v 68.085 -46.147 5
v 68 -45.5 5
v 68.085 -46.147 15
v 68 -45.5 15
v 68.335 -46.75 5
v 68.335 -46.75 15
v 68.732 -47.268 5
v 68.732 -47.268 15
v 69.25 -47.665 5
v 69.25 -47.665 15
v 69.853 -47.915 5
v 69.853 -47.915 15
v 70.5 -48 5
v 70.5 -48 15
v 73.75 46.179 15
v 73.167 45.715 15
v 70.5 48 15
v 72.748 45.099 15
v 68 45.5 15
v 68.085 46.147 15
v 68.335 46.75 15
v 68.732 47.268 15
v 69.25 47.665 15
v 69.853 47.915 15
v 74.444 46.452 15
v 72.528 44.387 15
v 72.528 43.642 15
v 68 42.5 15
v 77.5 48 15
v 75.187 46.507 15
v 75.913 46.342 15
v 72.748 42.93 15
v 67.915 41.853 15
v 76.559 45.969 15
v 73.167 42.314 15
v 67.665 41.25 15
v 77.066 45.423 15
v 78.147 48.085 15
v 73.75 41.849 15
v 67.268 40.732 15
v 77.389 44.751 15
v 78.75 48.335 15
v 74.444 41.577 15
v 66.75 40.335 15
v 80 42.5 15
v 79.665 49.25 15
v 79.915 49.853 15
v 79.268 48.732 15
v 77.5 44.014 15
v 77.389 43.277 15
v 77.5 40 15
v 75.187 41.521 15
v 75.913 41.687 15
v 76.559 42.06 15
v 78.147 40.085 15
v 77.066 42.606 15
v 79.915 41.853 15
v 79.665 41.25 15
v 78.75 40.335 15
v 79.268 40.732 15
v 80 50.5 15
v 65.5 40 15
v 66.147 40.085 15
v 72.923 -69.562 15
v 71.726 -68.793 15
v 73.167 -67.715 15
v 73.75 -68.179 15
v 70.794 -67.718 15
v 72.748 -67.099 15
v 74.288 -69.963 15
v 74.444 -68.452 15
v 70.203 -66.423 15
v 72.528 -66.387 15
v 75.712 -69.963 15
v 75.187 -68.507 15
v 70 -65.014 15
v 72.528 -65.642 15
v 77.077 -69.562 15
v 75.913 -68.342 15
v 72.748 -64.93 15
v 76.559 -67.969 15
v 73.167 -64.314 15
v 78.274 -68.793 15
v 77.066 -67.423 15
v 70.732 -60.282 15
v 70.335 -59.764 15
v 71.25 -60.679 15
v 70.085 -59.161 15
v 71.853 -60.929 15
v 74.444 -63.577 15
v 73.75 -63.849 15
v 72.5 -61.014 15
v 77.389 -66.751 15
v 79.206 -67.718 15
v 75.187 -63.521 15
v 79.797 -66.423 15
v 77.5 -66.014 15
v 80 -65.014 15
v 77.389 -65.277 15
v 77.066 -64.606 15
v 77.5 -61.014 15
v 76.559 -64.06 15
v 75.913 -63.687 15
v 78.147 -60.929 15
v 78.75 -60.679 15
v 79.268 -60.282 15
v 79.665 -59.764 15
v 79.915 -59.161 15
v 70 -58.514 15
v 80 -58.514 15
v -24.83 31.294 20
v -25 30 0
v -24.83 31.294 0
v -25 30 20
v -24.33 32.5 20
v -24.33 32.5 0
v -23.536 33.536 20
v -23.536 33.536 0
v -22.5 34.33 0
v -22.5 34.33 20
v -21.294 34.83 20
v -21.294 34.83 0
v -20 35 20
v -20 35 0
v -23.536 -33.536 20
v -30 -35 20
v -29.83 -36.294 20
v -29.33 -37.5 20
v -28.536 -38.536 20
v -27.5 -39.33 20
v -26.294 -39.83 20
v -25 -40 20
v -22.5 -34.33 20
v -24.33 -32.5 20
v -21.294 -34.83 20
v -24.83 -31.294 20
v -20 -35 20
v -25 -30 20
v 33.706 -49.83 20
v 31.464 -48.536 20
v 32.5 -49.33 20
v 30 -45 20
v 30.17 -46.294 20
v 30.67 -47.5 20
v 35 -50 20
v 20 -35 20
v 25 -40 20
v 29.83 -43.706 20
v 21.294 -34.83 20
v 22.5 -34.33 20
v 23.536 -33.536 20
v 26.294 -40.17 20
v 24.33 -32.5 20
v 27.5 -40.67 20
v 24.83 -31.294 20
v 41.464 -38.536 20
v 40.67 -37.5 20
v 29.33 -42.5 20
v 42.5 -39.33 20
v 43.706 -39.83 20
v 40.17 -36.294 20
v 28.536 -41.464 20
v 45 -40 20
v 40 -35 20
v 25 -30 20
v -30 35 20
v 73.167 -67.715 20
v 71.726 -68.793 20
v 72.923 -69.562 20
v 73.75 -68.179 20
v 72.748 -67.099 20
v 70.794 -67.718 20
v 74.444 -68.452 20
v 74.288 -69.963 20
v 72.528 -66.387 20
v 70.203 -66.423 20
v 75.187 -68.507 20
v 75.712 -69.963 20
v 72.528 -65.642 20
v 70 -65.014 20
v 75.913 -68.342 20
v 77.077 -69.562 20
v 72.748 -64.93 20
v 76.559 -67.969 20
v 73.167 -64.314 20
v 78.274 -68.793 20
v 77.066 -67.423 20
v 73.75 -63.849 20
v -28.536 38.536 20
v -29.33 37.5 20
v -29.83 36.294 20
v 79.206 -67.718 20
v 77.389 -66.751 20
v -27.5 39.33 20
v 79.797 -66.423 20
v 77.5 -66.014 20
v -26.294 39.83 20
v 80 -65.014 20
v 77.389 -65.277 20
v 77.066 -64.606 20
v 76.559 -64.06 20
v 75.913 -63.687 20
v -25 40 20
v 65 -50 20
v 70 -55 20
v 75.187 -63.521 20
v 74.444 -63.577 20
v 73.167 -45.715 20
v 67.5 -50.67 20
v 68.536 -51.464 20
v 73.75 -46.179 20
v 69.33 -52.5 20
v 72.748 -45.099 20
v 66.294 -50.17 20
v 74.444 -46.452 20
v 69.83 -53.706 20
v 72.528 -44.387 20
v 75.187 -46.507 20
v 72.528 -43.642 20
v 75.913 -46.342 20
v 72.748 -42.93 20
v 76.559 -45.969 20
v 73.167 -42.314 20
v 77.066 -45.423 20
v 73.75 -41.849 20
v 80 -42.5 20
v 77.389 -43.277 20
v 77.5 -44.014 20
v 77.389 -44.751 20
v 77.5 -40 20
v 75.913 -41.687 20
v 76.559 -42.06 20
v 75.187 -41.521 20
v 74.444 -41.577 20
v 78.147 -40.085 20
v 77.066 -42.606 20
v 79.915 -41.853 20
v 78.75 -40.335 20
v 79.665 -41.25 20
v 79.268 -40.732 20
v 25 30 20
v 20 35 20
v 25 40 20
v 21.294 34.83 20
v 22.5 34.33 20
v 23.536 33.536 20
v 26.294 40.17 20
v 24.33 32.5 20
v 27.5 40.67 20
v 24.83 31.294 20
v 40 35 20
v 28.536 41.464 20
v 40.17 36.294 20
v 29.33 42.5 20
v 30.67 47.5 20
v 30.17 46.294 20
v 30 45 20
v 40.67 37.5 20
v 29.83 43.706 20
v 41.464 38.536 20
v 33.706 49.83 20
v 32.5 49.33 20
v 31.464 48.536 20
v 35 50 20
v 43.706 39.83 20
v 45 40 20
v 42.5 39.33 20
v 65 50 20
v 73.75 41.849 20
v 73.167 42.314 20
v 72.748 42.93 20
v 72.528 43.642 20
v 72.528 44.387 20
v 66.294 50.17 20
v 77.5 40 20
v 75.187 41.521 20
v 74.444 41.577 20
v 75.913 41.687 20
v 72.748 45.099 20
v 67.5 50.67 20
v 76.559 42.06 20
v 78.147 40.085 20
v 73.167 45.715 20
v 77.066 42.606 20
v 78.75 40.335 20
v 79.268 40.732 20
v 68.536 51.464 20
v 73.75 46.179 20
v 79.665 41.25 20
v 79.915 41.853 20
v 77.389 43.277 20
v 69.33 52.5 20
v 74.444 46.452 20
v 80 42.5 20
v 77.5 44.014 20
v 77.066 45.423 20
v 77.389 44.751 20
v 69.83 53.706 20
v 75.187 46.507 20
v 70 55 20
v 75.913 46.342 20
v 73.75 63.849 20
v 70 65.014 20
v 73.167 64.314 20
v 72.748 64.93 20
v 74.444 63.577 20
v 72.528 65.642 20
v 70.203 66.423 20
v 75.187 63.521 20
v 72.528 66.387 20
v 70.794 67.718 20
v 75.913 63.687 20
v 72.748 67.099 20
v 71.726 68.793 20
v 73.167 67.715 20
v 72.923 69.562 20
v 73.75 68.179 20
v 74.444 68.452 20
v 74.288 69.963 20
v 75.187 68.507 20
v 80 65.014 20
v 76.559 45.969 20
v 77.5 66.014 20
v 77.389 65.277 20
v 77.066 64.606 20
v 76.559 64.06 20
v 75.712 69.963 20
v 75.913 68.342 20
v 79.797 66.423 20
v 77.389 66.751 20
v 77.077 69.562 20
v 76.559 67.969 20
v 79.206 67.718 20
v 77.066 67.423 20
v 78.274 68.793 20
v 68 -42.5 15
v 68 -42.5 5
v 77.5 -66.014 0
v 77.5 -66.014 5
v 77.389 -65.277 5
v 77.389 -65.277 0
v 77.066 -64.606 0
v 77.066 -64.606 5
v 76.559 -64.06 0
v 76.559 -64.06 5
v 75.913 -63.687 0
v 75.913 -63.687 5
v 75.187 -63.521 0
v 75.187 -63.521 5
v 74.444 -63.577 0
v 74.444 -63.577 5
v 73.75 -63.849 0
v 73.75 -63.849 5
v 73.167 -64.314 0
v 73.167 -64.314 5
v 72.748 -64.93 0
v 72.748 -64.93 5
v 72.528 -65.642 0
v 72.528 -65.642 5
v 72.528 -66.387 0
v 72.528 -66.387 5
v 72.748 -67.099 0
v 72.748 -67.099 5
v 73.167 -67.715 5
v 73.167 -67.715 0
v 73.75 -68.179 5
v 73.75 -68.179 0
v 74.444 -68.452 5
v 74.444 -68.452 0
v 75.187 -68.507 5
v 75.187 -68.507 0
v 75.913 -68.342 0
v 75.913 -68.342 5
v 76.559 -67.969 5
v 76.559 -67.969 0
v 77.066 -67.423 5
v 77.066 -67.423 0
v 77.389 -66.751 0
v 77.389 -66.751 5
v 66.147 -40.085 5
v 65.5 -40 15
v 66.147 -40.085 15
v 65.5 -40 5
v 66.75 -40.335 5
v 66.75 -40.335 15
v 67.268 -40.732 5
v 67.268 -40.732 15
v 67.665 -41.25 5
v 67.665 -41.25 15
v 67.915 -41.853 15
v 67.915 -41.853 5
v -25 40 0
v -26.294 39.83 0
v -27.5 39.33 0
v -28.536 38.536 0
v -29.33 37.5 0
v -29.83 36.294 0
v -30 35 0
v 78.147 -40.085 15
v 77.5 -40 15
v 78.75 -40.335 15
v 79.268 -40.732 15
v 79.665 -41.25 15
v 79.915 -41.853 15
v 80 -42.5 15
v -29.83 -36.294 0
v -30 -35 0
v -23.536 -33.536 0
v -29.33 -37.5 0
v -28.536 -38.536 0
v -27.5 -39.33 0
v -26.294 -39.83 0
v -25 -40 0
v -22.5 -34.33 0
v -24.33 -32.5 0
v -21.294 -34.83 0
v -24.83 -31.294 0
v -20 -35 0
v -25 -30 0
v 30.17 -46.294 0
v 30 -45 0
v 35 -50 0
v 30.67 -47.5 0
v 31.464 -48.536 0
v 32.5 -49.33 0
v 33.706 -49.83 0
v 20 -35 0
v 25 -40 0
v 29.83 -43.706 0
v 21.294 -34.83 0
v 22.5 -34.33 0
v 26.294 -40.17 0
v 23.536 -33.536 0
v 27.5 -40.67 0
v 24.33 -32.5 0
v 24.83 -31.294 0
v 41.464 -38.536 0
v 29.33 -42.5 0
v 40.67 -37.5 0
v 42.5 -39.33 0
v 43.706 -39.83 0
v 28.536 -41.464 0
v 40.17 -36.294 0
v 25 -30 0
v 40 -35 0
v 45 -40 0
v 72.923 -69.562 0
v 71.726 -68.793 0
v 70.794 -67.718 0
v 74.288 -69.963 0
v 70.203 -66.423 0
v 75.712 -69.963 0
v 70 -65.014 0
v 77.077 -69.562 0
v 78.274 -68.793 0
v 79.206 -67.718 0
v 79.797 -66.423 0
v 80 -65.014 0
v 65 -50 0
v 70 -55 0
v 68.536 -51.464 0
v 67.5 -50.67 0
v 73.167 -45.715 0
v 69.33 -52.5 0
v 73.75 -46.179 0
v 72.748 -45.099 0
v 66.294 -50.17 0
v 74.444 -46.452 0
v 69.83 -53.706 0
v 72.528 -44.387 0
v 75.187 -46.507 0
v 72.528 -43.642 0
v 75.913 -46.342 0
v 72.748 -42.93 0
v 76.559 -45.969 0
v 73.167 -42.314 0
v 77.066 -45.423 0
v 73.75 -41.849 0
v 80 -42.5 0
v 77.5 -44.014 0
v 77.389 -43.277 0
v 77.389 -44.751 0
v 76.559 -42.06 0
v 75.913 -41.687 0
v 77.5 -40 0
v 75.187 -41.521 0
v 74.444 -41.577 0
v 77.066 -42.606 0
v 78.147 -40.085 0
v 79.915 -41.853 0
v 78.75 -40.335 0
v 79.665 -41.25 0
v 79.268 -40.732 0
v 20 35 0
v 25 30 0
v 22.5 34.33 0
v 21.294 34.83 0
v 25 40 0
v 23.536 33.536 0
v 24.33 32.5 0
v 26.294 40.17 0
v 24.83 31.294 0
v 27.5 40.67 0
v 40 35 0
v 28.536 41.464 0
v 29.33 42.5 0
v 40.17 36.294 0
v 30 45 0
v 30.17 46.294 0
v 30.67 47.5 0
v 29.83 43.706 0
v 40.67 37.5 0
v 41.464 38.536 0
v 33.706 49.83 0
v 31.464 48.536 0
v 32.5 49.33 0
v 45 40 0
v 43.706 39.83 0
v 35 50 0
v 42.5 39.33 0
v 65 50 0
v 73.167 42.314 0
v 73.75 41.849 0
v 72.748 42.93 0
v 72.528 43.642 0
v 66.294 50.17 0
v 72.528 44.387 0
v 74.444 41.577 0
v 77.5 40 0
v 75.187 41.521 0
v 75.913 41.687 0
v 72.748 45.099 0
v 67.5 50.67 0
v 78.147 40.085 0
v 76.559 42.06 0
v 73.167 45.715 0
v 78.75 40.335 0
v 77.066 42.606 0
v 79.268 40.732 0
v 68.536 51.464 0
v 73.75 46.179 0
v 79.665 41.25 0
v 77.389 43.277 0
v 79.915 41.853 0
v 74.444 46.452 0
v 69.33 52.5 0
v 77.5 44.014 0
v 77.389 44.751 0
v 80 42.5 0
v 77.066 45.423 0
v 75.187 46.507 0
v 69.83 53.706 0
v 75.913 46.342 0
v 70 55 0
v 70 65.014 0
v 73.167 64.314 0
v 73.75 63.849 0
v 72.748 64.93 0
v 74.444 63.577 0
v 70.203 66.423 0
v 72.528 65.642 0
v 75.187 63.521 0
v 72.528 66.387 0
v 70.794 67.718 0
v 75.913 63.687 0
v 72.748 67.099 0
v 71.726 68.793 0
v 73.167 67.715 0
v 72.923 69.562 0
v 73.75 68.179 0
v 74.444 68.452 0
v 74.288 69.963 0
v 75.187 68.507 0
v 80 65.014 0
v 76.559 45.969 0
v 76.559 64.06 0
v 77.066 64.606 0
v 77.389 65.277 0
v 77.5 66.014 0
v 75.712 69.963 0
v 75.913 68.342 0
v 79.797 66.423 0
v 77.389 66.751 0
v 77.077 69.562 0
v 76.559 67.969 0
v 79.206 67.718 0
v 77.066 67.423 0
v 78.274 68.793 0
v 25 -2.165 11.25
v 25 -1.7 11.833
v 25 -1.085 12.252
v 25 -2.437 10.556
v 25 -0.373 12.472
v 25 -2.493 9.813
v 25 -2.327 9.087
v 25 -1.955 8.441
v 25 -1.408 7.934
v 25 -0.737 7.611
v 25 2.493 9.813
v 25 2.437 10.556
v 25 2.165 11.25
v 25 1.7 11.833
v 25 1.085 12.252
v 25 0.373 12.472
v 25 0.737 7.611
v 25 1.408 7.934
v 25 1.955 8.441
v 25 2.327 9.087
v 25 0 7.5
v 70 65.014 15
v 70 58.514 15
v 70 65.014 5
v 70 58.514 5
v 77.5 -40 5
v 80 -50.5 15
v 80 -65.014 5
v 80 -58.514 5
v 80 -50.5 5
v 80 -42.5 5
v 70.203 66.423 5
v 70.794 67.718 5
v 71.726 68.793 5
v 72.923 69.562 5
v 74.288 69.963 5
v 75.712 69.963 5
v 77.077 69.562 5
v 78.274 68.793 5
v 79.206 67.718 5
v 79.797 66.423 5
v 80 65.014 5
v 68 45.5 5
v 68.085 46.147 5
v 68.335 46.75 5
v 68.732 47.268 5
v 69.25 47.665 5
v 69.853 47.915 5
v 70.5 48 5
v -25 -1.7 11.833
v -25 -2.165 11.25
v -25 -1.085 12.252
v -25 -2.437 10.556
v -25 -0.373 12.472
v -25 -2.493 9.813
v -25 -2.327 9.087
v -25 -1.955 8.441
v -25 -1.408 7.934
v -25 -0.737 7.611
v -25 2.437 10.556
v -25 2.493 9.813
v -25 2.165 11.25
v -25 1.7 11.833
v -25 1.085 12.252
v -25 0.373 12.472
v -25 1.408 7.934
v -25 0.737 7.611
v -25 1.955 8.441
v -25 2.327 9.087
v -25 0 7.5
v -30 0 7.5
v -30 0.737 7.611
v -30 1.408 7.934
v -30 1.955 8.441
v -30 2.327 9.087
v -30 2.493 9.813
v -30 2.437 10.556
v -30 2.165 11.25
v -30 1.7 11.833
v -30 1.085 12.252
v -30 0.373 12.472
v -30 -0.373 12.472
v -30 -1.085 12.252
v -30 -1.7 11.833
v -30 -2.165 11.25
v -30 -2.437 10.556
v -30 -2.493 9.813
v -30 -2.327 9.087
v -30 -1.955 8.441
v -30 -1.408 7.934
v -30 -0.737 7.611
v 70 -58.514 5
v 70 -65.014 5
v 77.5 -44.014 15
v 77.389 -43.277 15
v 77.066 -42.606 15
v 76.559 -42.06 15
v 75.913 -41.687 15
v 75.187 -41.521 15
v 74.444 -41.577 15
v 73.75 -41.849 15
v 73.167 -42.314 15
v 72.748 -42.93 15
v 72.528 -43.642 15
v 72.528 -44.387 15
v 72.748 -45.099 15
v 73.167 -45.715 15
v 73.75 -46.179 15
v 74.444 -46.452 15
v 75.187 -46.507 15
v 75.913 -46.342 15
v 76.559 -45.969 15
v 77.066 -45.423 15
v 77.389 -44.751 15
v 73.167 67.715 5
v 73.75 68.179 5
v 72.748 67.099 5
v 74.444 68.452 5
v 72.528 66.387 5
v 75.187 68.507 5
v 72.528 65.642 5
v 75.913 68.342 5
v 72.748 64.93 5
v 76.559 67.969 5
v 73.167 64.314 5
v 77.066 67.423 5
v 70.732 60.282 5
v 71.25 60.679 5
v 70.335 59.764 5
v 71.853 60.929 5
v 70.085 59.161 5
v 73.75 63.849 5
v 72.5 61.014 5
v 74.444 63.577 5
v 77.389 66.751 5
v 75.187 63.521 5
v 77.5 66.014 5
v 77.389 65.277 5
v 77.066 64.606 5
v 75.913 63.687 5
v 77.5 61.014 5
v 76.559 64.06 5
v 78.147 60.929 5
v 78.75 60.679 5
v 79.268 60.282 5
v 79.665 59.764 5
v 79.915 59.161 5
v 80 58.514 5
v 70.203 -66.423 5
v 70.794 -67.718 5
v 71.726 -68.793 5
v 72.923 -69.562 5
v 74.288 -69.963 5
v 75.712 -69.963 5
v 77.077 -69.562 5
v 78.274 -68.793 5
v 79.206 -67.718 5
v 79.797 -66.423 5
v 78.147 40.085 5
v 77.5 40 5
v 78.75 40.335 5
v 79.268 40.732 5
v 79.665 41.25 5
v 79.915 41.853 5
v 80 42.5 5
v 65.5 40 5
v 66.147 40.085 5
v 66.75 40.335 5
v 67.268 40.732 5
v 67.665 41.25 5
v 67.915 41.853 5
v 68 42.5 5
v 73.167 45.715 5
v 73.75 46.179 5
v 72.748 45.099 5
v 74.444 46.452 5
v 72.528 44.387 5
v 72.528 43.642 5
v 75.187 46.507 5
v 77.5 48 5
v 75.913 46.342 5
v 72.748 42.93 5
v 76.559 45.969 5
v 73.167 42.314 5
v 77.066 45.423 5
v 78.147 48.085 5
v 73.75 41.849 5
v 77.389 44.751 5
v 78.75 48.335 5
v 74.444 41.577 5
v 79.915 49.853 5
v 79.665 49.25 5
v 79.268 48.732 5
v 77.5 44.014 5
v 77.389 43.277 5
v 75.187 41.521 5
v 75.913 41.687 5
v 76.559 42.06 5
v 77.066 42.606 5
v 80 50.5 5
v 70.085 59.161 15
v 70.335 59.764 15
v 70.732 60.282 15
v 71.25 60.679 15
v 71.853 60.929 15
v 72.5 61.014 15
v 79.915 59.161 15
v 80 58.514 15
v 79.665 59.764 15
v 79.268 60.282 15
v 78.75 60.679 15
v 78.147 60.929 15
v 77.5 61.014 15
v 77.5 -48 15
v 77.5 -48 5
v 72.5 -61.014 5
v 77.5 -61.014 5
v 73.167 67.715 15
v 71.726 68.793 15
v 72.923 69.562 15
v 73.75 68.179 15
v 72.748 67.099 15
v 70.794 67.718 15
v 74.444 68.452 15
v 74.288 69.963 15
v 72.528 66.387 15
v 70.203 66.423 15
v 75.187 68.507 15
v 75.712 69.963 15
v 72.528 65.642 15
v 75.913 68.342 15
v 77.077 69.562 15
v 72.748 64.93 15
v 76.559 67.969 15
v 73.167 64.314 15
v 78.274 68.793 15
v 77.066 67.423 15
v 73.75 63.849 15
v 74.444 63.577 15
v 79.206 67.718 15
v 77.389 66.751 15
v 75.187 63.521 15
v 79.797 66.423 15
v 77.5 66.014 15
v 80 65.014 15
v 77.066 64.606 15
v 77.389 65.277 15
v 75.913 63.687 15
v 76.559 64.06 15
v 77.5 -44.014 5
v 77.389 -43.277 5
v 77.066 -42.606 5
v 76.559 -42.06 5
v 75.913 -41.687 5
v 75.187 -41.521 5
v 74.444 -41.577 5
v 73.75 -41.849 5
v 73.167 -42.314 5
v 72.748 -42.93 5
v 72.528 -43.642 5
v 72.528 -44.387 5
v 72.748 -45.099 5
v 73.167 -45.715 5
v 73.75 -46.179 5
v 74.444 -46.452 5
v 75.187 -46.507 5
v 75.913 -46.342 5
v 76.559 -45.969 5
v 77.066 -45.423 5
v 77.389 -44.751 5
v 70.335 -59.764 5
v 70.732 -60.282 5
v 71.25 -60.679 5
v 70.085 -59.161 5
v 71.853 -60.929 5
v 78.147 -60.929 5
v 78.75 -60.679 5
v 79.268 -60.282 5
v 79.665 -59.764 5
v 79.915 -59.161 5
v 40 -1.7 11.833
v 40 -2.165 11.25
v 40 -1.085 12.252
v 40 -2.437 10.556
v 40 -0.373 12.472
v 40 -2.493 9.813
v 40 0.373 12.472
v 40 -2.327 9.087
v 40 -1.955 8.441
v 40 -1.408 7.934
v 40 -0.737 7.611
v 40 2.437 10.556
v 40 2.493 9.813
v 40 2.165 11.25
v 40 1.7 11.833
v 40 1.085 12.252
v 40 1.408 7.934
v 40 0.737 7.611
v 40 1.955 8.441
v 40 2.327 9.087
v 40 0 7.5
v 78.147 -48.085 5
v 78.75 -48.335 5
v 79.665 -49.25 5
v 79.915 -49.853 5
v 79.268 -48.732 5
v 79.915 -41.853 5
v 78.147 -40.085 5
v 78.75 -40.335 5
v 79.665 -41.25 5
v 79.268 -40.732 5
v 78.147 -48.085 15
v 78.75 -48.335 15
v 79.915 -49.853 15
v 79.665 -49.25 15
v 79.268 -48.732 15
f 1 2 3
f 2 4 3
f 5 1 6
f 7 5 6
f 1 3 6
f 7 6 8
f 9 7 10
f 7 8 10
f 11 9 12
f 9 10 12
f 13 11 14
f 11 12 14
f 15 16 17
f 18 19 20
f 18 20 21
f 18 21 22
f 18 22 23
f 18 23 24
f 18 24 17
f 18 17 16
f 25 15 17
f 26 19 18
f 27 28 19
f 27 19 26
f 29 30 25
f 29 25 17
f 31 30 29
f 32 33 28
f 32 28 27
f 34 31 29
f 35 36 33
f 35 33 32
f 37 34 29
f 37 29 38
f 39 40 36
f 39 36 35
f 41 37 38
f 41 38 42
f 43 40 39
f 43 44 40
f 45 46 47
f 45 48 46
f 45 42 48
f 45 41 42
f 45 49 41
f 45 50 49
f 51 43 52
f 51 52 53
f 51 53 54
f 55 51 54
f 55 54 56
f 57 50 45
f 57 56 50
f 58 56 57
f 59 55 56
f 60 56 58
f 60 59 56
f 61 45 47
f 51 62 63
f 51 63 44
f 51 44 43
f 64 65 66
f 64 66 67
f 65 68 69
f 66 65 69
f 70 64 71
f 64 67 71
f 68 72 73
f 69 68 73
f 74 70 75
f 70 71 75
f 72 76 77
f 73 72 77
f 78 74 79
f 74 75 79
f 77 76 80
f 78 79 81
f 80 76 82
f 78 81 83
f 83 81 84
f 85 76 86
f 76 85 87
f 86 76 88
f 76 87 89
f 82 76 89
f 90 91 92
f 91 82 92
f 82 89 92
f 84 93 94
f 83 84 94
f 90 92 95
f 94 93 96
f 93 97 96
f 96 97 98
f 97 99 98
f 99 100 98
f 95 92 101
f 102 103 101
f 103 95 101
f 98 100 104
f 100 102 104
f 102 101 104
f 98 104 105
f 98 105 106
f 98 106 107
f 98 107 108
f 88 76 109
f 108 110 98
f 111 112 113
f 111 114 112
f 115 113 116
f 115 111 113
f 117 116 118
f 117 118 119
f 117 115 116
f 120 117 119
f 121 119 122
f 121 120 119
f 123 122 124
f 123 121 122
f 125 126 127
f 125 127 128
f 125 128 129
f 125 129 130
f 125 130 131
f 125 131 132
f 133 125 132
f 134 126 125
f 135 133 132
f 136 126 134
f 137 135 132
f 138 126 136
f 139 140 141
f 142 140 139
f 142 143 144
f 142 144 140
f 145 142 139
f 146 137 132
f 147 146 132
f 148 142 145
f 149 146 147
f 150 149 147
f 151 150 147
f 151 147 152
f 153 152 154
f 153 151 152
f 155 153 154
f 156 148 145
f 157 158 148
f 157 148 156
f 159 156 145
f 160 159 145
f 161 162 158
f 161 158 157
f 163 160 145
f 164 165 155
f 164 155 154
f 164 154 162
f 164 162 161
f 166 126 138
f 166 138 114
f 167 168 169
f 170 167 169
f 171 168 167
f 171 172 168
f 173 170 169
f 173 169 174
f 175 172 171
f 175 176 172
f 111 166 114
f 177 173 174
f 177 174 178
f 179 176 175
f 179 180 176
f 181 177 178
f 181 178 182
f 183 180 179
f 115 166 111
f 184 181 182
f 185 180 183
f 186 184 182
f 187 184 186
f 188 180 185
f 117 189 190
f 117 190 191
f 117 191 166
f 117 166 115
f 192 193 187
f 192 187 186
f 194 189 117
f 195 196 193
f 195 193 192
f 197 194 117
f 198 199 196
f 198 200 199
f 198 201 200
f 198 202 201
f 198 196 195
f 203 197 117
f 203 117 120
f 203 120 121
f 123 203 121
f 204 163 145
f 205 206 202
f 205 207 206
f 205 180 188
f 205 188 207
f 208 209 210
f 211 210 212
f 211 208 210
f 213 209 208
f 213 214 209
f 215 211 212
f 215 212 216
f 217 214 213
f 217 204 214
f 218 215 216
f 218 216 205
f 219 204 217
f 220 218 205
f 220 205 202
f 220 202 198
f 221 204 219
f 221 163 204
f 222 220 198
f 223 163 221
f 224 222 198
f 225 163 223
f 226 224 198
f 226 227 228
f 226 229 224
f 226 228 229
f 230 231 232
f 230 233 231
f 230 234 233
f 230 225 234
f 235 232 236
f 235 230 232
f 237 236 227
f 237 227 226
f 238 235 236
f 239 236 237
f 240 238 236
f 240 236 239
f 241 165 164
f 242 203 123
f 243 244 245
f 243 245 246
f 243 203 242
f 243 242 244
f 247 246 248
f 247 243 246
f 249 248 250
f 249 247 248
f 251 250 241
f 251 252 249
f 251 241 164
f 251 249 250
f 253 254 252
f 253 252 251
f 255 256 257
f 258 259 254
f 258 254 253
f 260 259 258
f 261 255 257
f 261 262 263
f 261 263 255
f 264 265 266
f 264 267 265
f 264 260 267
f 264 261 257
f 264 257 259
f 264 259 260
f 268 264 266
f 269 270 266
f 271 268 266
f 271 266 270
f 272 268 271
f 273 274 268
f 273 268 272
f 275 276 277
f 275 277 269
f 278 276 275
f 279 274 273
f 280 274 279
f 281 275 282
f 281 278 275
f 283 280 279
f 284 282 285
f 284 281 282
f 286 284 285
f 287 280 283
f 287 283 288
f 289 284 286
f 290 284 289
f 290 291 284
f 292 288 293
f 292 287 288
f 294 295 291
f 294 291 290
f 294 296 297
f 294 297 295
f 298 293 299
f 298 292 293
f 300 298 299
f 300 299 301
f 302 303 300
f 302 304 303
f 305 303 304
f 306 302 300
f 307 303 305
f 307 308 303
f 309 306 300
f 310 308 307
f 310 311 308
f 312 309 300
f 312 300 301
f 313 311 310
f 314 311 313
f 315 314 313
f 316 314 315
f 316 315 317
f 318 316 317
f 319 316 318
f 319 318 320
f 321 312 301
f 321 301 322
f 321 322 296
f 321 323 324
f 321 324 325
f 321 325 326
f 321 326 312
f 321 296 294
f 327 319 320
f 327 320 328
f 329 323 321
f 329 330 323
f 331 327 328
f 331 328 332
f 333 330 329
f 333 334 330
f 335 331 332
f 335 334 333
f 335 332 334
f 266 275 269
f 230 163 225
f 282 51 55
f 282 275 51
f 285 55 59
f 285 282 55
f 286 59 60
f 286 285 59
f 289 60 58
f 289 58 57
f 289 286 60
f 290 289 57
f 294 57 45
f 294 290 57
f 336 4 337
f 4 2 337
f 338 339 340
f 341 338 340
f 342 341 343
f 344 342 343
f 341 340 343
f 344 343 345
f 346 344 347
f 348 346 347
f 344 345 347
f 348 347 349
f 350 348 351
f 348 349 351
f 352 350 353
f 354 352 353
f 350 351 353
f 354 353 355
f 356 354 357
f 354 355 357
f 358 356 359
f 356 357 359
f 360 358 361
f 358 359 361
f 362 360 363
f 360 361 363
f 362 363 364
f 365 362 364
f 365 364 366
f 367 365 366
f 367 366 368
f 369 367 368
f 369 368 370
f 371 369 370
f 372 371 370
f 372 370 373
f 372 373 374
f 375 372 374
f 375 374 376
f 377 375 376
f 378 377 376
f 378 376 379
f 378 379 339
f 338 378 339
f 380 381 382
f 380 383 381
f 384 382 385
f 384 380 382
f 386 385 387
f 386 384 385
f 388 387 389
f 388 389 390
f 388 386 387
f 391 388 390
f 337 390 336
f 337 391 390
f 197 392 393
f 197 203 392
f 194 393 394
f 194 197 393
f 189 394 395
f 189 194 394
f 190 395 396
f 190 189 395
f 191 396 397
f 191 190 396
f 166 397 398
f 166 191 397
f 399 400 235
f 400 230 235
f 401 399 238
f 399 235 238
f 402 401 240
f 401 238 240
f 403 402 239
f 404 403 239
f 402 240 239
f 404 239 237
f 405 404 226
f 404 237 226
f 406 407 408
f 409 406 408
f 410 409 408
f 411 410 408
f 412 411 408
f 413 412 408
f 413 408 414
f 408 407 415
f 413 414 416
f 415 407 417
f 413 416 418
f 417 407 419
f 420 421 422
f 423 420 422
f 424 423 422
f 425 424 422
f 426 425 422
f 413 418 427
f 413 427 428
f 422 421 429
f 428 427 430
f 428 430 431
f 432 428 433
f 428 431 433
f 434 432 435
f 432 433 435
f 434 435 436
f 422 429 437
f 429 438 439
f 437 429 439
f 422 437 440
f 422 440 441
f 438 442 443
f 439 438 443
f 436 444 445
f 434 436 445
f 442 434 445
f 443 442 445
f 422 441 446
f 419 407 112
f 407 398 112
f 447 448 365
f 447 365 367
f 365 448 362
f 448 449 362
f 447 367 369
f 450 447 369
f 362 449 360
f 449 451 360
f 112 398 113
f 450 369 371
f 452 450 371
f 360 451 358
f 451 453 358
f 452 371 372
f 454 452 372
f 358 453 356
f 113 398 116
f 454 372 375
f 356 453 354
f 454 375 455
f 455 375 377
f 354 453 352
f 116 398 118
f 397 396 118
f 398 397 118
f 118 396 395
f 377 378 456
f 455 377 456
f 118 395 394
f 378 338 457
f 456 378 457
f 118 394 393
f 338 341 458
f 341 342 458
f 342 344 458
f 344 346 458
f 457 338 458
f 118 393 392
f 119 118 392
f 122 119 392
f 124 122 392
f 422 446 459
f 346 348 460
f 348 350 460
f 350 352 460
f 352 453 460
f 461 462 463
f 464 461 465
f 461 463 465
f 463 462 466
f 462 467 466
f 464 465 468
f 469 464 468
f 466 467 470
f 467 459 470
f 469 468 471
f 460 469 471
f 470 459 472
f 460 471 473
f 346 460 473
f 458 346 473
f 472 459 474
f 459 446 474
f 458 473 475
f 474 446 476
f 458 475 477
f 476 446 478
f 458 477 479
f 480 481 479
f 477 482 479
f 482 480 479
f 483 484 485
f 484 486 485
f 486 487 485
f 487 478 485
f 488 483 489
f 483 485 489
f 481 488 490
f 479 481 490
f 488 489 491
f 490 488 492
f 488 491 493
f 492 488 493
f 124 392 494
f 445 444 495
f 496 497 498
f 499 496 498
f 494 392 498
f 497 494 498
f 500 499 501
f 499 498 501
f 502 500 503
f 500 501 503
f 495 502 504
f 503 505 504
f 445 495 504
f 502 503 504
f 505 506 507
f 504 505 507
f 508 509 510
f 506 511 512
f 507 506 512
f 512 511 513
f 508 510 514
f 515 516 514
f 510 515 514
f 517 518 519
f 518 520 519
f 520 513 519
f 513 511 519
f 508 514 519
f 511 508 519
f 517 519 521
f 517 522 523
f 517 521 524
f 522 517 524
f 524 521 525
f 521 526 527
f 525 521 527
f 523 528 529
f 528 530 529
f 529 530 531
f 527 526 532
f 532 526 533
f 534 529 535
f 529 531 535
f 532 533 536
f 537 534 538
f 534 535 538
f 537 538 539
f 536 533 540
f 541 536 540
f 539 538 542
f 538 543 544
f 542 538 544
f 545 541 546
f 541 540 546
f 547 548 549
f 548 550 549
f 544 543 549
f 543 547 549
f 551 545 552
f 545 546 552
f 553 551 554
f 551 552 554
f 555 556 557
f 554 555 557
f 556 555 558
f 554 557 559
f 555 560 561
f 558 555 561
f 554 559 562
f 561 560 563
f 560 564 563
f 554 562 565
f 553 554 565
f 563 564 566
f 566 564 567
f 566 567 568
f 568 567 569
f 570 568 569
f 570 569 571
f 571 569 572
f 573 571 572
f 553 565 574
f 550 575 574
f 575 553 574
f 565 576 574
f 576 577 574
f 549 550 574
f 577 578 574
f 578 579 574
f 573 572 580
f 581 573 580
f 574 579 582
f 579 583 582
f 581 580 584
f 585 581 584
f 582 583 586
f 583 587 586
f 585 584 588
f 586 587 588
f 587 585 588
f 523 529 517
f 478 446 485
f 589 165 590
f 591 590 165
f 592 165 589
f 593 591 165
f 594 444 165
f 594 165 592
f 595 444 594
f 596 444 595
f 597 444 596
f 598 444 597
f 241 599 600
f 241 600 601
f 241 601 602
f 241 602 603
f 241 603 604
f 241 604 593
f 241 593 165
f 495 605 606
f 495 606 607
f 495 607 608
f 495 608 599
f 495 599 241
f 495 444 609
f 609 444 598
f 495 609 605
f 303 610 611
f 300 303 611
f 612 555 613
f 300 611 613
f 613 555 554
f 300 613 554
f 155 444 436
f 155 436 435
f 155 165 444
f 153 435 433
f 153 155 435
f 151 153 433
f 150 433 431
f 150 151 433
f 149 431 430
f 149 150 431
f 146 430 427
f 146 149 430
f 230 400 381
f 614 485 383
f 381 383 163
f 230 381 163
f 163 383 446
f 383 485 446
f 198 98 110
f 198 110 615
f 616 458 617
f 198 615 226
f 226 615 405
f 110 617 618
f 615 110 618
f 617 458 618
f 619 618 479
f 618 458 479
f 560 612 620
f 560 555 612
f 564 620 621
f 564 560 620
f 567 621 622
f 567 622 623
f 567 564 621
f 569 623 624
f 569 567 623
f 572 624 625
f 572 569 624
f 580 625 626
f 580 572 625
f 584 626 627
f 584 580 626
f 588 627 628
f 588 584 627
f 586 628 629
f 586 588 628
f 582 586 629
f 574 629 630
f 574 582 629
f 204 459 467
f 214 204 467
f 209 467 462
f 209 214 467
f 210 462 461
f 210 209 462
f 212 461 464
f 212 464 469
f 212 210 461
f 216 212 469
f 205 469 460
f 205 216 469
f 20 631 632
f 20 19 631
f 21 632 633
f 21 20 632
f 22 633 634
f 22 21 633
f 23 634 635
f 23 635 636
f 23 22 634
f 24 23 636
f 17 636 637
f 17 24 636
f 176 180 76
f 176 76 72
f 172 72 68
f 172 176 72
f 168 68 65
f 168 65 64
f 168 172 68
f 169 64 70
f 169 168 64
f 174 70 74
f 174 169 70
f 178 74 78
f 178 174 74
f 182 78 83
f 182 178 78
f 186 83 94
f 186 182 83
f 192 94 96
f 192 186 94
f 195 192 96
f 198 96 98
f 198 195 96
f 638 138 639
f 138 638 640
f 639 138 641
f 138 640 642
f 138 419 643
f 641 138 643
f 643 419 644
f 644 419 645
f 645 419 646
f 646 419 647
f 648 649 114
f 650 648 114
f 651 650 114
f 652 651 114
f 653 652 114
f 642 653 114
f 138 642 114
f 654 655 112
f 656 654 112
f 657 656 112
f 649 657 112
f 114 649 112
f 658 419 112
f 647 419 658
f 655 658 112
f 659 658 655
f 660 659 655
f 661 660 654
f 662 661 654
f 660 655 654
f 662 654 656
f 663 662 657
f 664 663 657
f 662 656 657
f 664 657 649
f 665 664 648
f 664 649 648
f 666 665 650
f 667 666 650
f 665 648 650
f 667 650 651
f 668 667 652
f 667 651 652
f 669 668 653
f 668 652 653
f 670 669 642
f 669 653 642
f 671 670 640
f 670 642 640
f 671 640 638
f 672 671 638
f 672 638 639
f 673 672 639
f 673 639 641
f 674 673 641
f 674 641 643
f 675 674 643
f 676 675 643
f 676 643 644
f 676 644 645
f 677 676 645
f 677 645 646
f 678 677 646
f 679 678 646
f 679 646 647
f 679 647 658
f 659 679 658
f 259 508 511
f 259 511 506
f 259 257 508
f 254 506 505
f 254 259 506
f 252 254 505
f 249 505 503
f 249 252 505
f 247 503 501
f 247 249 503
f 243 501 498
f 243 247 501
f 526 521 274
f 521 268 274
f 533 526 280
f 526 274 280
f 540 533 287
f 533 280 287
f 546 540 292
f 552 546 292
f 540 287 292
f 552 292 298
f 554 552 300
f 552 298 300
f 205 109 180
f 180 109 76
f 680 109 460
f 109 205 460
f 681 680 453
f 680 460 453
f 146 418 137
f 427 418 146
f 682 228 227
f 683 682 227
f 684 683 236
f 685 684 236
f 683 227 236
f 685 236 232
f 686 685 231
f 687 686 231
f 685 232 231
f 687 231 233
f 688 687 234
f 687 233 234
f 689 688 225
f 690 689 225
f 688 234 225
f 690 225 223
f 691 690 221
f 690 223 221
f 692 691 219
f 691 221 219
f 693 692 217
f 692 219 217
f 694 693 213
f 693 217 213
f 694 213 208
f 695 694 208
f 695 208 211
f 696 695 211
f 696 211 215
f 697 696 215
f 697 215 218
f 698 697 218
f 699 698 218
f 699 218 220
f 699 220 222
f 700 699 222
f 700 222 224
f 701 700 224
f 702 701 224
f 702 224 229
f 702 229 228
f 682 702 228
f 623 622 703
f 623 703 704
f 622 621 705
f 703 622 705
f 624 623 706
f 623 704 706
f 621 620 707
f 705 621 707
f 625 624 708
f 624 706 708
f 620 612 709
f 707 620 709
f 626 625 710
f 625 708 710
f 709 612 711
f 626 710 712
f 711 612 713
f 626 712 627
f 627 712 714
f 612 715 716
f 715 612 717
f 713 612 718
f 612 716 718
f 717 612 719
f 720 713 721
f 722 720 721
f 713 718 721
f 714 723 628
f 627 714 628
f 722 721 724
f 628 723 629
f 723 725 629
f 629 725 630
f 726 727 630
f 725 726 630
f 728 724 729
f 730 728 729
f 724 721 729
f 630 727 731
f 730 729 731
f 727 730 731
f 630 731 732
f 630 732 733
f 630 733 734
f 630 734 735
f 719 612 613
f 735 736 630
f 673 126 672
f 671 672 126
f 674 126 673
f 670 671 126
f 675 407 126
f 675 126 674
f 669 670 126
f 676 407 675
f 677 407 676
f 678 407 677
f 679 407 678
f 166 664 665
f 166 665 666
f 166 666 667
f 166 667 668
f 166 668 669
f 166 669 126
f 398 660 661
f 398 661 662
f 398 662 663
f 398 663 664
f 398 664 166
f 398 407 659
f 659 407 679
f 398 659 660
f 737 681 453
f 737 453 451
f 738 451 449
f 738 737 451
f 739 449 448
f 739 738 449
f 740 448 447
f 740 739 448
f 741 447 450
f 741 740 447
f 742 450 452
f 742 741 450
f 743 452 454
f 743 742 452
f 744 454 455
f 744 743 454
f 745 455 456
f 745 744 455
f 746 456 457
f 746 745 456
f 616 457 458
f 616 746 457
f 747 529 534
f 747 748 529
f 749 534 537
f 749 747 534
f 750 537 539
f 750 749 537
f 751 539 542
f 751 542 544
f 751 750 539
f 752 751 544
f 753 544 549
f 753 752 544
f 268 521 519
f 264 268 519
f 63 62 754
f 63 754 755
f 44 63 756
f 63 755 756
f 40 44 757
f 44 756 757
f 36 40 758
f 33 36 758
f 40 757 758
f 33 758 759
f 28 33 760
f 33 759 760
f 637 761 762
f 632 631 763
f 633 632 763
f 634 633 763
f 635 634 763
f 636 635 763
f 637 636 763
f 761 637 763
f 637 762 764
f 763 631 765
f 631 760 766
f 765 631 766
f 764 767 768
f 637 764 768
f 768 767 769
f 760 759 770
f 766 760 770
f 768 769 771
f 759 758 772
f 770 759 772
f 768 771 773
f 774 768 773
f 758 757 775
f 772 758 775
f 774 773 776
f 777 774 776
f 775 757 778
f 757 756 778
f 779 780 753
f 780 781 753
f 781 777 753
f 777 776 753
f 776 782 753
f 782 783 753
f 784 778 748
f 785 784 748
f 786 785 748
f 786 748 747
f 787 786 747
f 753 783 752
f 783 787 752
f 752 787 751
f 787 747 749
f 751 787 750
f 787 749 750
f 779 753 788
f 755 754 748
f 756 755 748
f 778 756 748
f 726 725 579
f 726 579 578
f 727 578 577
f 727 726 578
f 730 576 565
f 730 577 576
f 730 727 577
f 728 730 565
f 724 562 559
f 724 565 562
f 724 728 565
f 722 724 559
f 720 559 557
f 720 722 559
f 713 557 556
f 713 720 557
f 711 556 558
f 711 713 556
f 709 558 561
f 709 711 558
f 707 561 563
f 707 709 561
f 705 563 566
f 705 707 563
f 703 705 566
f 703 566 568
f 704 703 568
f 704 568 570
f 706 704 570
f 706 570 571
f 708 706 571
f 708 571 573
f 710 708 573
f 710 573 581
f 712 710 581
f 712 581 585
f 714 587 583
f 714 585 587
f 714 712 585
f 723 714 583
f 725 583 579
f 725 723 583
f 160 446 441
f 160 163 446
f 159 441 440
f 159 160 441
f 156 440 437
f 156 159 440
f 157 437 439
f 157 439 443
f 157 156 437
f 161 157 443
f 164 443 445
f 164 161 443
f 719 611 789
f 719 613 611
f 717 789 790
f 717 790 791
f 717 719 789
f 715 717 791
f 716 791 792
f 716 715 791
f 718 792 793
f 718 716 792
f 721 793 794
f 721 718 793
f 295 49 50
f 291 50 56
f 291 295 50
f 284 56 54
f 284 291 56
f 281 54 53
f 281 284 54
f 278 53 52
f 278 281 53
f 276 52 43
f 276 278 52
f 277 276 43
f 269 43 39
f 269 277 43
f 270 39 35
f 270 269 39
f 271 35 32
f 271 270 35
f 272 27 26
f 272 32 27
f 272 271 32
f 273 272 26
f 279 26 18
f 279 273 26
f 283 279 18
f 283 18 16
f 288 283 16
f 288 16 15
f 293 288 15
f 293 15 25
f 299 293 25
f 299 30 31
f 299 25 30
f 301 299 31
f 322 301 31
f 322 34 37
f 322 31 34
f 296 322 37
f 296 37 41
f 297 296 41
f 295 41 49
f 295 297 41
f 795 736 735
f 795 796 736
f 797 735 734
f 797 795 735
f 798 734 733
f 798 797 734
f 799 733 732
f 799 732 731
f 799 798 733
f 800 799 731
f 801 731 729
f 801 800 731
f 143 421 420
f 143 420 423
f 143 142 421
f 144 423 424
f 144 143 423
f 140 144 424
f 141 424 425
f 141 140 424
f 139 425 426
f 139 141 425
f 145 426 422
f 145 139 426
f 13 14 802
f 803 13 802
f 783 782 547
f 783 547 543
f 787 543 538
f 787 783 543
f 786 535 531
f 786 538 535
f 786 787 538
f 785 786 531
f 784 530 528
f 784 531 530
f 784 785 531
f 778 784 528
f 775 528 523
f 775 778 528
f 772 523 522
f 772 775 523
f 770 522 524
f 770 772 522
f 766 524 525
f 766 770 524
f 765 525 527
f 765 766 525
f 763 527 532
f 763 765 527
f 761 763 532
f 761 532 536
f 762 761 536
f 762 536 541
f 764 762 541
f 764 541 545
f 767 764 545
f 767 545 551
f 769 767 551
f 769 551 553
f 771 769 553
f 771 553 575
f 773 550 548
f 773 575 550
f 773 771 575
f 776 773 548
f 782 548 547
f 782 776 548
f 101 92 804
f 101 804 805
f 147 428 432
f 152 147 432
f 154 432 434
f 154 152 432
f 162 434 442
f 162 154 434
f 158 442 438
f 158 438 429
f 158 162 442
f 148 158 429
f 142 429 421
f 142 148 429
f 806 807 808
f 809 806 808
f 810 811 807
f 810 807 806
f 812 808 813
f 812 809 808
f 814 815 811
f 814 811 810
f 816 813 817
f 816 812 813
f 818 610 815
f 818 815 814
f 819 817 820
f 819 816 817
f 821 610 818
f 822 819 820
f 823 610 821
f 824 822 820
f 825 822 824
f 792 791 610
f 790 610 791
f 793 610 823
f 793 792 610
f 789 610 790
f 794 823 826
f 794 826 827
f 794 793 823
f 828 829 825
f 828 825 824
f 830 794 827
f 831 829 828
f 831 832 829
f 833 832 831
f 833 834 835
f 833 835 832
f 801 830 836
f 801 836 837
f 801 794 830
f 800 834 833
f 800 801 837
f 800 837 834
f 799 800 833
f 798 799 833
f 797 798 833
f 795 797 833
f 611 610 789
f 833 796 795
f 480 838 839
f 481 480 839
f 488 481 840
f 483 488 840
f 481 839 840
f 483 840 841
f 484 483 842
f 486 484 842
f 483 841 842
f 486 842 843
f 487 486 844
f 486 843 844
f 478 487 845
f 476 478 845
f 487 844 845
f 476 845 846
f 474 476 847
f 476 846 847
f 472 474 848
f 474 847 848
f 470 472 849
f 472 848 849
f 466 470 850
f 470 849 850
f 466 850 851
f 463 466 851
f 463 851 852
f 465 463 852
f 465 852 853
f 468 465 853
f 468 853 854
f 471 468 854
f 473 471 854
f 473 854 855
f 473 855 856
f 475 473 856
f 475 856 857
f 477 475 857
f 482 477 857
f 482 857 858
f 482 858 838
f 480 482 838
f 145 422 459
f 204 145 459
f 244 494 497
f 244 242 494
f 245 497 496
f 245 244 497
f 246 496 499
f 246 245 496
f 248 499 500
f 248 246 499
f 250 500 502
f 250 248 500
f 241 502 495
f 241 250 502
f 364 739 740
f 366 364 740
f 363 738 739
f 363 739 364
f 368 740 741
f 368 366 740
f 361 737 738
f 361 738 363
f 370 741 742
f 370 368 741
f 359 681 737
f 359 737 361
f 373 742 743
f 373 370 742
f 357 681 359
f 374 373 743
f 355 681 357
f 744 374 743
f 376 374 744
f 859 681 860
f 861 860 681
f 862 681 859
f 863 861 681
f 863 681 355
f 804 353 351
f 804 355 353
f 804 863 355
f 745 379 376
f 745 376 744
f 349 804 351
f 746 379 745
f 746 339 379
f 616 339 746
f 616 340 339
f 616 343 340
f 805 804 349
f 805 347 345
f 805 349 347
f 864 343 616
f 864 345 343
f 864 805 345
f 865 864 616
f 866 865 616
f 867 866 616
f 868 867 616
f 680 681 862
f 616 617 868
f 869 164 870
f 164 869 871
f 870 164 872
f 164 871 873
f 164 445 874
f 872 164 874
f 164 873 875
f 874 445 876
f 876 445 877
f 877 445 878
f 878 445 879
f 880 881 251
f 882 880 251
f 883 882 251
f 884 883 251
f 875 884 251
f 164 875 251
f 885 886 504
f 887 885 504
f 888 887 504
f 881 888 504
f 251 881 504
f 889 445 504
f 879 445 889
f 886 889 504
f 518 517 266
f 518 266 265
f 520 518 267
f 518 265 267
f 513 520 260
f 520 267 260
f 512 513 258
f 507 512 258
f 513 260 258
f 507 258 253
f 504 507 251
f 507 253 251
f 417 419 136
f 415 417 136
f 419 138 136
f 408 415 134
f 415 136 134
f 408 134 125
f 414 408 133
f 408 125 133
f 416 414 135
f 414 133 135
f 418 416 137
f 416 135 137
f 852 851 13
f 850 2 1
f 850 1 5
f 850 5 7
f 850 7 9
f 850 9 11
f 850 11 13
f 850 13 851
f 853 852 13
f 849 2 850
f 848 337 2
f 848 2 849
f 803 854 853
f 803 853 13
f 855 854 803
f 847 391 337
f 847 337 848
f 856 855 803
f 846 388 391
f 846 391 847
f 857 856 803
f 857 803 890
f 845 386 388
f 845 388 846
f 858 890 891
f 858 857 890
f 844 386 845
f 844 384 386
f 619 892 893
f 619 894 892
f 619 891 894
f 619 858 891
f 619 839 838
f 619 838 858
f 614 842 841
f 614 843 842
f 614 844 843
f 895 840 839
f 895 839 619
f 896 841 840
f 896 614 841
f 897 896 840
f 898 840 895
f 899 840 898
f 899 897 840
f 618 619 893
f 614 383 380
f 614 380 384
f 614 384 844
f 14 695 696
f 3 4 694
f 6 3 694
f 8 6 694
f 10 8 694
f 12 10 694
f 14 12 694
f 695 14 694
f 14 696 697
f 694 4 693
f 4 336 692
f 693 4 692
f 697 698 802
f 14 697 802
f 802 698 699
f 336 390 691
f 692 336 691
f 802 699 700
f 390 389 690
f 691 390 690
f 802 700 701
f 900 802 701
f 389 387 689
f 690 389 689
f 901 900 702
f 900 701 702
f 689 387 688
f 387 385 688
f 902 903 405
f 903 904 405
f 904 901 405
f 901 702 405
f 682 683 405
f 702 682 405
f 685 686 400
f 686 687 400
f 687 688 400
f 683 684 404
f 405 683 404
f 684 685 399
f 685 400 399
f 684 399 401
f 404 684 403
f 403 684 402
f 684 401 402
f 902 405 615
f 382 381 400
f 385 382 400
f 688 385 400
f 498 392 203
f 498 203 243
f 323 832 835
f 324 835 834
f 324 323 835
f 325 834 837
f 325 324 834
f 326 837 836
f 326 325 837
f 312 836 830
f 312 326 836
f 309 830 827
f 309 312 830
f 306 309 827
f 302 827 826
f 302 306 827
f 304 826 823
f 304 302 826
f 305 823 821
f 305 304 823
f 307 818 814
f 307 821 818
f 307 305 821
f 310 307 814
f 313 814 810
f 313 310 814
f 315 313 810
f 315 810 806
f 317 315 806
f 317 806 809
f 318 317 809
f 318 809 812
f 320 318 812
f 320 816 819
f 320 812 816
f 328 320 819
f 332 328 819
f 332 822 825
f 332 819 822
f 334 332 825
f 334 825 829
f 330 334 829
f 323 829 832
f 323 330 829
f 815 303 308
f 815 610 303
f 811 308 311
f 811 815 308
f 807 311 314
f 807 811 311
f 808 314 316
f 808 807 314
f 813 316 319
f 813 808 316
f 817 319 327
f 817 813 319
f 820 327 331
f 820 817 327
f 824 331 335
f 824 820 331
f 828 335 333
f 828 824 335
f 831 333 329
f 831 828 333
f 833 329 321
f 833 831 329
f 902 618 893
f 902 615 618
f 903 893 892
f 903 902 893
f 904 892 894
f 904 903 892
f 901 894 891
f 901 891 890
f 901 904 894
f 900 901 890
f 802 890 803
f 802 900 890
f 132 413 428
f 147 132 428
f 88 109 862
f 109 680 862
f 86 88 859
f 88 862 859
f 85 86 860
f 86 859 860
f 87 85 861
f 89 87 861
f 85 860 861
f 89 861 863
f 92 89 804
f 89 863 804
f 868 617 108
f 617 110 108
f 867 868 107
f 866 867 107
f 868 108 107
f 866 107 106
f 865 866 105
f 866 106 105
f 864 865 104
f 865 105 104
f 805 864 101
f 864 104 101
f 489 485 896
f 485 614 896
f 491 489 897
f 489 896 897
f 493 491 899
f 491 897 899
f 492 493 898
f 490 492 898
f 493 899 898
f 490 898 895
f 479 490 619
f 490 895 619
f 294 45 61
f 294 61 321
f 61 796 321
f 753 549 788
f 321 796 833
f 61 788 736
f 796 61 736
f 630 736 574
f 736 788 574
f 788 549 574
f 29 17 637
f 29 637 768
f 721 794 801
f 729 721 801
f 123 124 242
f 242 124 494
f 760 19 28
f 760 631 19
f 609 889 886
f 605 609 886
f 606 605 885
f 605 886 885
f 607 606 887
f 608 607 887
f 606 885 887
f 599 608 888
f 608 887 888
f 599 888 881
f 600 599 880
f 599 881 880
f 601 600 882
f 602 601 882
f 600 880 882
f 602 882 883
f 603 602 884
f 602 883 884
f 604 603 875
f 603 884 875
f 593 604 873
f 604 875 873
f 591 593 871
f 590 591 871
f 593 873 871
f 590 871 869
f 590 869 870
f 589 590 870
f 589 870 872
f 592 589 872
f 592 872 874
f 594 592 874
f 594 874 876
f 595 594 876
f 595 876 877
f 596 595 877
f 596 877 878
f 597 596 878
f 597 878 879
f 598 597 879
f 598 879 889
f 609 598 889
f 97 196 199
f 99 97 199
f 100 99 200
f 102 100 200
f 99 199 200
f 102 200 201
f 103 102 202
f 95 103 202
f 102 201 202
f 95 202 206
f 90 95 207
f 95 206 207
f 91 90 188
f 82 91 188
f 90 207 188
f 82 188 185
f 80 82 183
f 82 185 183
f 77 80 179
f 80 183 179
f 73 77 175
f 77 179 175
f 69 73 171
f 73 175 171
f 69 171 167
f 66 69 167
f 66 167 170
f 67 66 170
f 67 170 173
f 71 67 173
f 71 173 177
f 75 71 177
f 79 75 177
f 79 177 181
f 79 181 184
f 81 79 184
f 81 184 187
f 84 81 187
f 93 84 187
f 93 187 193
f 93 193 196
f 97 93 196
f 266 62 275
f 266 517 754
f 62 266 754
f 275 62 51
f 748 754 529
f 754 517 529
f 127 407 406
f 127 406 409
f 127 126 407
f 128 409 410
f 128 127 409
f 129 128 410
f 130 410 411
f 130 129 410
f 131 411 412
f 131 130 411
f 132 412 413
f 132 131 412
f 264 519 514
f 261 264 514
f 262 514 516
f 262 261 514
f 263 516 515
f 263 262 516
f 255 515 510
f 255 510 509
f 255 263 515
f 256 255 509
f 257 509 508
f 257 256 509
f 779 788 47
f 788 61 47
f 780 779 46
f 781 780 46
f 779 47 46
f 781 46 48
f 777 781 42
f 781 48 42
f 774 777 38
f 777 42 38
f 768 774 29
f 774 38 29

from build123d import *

# Parameters (mm, degrees)
SKETCH1_W           = 60
SKETCH1_H           = 80
SKETCH1_W_2         = 50
SKETCH1_H_2         = 70
EXTRUDE_THIN2_DEPTH = 20
EXTRUDE_THIN4_START = -20
EXTRUDE_THIN4_DEPTH = 20
SKETCH3_R           = 2.5
CUT_EXTRUDE1_DEPTH  = 115.891252931
SKETCH4_W           = 17.535354843
SKETCH4_H           = 20
CUT_EXTRUDE2_DEPTH  = 115.891252931
FILLET1_RADIUS      = 5
FILLET1_LENGTH      = 20
SKETCH5_W           = 12
SKETCH5_H           = 8
SKETCH5_W_2         = 13.595286796
SKETCH5_H_2         = 19.881342556
CUT_EXTRUDE3_DEPTH  = 5
FILLET2_RADIUS      = 5
FILLET2_LENGTH      = 20
SKETCH6_R           = 2.5
CUT_EXTRUDE4_DEPTH  = 102.004981635
FILLET3_R           = 5
FILLET4_R           = 2.5


# Read off the part's stored shape, not the designer's step: Extrude-Thin4
with BuildPart() as part:
    # Sketch1 → Extrude-Thin2 (new body)
    with BuildSketch(Plane.XY):
        Rectangle(SKETCH1_W, SKETCH1_H)
        Rectangle(SKETCH1_W_2, SKETCH1_H_2, mode=Mode.SUBTRACT)
    extrude(amount=EXTRUDE_THIN2_DEPTH)

    # Extrude-Thin4 outline → Extrude-Thin4 (add)
    with BuildSketch(Plane.XY.offset(20).offset(EXTRUDE_THIN4_START)):
        Polygon((70, 50), (30, 50), (30, -50), (70, -50), (70, -80), (80, -80), (80, -40), (40, -40), (40, 40), (80, 40), (80, 80), (70, 80), align=None)
    extrude(amount=EXTRUDE_THIN4_DEPTH)

    # Sketch3 → Cut-Extrude1 (cut, through all)
    with BuildSketch(Plane.XY.offset(20)):
        with Locations((75, -66.014329355)):
            Circle(SKETCH3_R)
        with Locations((75, -44.014329355)):
            Circle(SKETCH3_R)
    cut_extrude1 = extrude(amount=-CUT_EXTRUDE1_DEPTH, mode=Mode.SUBTRACT)

    # Sketch4 → Cut-Extrude2 (cut, through all)
    with BuildSketch(Plane.XY.offset(20)):
        with Locations((73.91933671, -80.014329355)):
            Rectangle(SKETCH4_W, SKETCH4_H)
    cut_extrude2 = extrude(amount=-CUT_EXTRUDE2_DEPTH, mode=Mode.SUBTRACT)

    # Fillet1: full round fillet: the end face becomes a half cylinder, R = half its width
    fillet1_face = Plane((75, -70.014329355, 10), x_dir=(0, 0, 1), z_dir=(0, -1, 0))  # on the end face: x along it, z out of the body
    fillet1_slab = fillet1_face.offset(-FILLET1_RADIUS / 2) * Box(FILLET1_LENGTH, 2 * FILLET1_RADIUS, FILLET1_RADIUS, mode=Mode.PRIVATE)  # the body's end, R deep
    fillet1_round = Plane((75, -65.014329355, 10), x_dir=(0, -1, 0), z_dir=(0, 0, 1)) * Cylinder(FILLET1_RADIUS, FILLET1_LENGTH, mode=Mode.PRIVATE)  # its axis R under the face
    add(fillet1_slab - fillet1_round, mode=Mode.SUBTRACT)

    # Sketch5 → Cut-Extrude3 (cut, symmetric)
    with BuildSketch(Plane.XY.offset(10)):
        with Locations((74, -44)):
            Rectangle(SKETCH5_W, SKETCH5_H)
        with Locations((75.604543017, -70.955000633)):
            Rectangle(SKETCH5_W_2, SKETCH5_H_2)
    cut_extrude3 = extrude(amount=CUT_EXTRUDE3_DEPTH, both=True, mode=Mode.SUBTRACT)

    # Mirror6: Cut-Extrude1 across plane
    add(cut_extrude1.mirror(Plane(origin=(0, 0, 0), x_dir=(0, 0, 1), z_dir=(0, -1, 0))), mode=Mode.SUBTRACT)

    # Mirror8: Cut-Extrude2 across plane
    add(cut_extrude2.mirror(Plane(origin=(0, 0, 0), x_dir=(0, 0, 1), z_dir=(0, -1, 0))), mode=Mode.SUBTRACT)

    # Fillet2: full round fillet: the end face becomes a half cylinder, R = half its width
    fillet2_face = Plane((75, 70.014329355, 10), x_dir=(0, 0, -1), z_dir=(0, 1, 0))  # on the end face: x along it, z out of the body
    fillet2_slab = fillet2_face.offset(-FILLET2_RADIUS / 2) * Box(FILLET2_LENGTH, 2 * FILLET2_RADIUS, FILLET2_RADIUS, mode=Mode.PRIVATE)  # the body's end, R deep
    fillet2_round = Plane((75, 65.014329355, 10), x_dir=(0, 1, 0), z_dir=(0, 0, -1)) * Cylinder(FILLET2_RADIUS, FILLET2_LENGTH, mode=Mode.PRIVATE)  # its axis R under the face
    add(fillet2_slab - fillet2_round, mode=Mode.SUBTRACT)

    # Mirror9: Cut-Extrude3 across plane
    add(cut_extrude3.mirror(Plane(origin=(0, 0, 0), x_dir=(0, 0, 1), z_dir=(0, -1, 0))), mode=Mode.SUBTRACT)

    # Sketch6 → Cut-Extrude4 (cut, through all)
    with BuildSketch(Plane(origin=(40, 0, 0), x_dir=(0, 0, -1), z_dir=(1, 0, 0))):
        with Locations((-10, 0)):
            Circle(SKETCH6_R)
    extrude(amount=-CUT_EXTRUDE4_DEPTH, mode=Mode.SUBTRACT)

    # Fillet3
    fillet3_edges = [part.edges().sort_by_distance(p)[0] for p in [
        (-30, -40, 10),
        (70, -50, 10),
        (70, 50, 10),
        (30, 50, 10),
        (30, -50, 10),
        (-25, -35, 10),
        (25, -35, 10),
        (25, 35, 10),
        (-25, 35, 10),
        (30, -40, 10),
        (30, 40, 10),
        (-30, 40, 10),
        (40, -40, 10),
        (40, 40, 10),
    ]]
    fillet(fillet3_edges, radius=FILLET3_R - 0.0001)  # a hair under: the kernel refuses the full size

    # Fillet4
    fillet4_edges = [part.edges().sort_by_distance(p)[0] for p in [
        (80, -40, 17.5),
        (80, -61.014329355, 10),
        (80, -48, 10),
        (68, -40, 10),
        (68, -48, 10),
        (70, -61.014329355, 10),
        (80, 40, 17.5),
        (80, 61.014329355, 10),
        (80, 48, 10),
        (68, 48, 10),
        (68, 40, 10),
        (70, 61.014329355, 10),
        (80, 40, 2.5),
        (80, -40, 2.5),
    ]]
    fillet(fillet4_edges, radius=FILLET4_R)


solid = part.part
